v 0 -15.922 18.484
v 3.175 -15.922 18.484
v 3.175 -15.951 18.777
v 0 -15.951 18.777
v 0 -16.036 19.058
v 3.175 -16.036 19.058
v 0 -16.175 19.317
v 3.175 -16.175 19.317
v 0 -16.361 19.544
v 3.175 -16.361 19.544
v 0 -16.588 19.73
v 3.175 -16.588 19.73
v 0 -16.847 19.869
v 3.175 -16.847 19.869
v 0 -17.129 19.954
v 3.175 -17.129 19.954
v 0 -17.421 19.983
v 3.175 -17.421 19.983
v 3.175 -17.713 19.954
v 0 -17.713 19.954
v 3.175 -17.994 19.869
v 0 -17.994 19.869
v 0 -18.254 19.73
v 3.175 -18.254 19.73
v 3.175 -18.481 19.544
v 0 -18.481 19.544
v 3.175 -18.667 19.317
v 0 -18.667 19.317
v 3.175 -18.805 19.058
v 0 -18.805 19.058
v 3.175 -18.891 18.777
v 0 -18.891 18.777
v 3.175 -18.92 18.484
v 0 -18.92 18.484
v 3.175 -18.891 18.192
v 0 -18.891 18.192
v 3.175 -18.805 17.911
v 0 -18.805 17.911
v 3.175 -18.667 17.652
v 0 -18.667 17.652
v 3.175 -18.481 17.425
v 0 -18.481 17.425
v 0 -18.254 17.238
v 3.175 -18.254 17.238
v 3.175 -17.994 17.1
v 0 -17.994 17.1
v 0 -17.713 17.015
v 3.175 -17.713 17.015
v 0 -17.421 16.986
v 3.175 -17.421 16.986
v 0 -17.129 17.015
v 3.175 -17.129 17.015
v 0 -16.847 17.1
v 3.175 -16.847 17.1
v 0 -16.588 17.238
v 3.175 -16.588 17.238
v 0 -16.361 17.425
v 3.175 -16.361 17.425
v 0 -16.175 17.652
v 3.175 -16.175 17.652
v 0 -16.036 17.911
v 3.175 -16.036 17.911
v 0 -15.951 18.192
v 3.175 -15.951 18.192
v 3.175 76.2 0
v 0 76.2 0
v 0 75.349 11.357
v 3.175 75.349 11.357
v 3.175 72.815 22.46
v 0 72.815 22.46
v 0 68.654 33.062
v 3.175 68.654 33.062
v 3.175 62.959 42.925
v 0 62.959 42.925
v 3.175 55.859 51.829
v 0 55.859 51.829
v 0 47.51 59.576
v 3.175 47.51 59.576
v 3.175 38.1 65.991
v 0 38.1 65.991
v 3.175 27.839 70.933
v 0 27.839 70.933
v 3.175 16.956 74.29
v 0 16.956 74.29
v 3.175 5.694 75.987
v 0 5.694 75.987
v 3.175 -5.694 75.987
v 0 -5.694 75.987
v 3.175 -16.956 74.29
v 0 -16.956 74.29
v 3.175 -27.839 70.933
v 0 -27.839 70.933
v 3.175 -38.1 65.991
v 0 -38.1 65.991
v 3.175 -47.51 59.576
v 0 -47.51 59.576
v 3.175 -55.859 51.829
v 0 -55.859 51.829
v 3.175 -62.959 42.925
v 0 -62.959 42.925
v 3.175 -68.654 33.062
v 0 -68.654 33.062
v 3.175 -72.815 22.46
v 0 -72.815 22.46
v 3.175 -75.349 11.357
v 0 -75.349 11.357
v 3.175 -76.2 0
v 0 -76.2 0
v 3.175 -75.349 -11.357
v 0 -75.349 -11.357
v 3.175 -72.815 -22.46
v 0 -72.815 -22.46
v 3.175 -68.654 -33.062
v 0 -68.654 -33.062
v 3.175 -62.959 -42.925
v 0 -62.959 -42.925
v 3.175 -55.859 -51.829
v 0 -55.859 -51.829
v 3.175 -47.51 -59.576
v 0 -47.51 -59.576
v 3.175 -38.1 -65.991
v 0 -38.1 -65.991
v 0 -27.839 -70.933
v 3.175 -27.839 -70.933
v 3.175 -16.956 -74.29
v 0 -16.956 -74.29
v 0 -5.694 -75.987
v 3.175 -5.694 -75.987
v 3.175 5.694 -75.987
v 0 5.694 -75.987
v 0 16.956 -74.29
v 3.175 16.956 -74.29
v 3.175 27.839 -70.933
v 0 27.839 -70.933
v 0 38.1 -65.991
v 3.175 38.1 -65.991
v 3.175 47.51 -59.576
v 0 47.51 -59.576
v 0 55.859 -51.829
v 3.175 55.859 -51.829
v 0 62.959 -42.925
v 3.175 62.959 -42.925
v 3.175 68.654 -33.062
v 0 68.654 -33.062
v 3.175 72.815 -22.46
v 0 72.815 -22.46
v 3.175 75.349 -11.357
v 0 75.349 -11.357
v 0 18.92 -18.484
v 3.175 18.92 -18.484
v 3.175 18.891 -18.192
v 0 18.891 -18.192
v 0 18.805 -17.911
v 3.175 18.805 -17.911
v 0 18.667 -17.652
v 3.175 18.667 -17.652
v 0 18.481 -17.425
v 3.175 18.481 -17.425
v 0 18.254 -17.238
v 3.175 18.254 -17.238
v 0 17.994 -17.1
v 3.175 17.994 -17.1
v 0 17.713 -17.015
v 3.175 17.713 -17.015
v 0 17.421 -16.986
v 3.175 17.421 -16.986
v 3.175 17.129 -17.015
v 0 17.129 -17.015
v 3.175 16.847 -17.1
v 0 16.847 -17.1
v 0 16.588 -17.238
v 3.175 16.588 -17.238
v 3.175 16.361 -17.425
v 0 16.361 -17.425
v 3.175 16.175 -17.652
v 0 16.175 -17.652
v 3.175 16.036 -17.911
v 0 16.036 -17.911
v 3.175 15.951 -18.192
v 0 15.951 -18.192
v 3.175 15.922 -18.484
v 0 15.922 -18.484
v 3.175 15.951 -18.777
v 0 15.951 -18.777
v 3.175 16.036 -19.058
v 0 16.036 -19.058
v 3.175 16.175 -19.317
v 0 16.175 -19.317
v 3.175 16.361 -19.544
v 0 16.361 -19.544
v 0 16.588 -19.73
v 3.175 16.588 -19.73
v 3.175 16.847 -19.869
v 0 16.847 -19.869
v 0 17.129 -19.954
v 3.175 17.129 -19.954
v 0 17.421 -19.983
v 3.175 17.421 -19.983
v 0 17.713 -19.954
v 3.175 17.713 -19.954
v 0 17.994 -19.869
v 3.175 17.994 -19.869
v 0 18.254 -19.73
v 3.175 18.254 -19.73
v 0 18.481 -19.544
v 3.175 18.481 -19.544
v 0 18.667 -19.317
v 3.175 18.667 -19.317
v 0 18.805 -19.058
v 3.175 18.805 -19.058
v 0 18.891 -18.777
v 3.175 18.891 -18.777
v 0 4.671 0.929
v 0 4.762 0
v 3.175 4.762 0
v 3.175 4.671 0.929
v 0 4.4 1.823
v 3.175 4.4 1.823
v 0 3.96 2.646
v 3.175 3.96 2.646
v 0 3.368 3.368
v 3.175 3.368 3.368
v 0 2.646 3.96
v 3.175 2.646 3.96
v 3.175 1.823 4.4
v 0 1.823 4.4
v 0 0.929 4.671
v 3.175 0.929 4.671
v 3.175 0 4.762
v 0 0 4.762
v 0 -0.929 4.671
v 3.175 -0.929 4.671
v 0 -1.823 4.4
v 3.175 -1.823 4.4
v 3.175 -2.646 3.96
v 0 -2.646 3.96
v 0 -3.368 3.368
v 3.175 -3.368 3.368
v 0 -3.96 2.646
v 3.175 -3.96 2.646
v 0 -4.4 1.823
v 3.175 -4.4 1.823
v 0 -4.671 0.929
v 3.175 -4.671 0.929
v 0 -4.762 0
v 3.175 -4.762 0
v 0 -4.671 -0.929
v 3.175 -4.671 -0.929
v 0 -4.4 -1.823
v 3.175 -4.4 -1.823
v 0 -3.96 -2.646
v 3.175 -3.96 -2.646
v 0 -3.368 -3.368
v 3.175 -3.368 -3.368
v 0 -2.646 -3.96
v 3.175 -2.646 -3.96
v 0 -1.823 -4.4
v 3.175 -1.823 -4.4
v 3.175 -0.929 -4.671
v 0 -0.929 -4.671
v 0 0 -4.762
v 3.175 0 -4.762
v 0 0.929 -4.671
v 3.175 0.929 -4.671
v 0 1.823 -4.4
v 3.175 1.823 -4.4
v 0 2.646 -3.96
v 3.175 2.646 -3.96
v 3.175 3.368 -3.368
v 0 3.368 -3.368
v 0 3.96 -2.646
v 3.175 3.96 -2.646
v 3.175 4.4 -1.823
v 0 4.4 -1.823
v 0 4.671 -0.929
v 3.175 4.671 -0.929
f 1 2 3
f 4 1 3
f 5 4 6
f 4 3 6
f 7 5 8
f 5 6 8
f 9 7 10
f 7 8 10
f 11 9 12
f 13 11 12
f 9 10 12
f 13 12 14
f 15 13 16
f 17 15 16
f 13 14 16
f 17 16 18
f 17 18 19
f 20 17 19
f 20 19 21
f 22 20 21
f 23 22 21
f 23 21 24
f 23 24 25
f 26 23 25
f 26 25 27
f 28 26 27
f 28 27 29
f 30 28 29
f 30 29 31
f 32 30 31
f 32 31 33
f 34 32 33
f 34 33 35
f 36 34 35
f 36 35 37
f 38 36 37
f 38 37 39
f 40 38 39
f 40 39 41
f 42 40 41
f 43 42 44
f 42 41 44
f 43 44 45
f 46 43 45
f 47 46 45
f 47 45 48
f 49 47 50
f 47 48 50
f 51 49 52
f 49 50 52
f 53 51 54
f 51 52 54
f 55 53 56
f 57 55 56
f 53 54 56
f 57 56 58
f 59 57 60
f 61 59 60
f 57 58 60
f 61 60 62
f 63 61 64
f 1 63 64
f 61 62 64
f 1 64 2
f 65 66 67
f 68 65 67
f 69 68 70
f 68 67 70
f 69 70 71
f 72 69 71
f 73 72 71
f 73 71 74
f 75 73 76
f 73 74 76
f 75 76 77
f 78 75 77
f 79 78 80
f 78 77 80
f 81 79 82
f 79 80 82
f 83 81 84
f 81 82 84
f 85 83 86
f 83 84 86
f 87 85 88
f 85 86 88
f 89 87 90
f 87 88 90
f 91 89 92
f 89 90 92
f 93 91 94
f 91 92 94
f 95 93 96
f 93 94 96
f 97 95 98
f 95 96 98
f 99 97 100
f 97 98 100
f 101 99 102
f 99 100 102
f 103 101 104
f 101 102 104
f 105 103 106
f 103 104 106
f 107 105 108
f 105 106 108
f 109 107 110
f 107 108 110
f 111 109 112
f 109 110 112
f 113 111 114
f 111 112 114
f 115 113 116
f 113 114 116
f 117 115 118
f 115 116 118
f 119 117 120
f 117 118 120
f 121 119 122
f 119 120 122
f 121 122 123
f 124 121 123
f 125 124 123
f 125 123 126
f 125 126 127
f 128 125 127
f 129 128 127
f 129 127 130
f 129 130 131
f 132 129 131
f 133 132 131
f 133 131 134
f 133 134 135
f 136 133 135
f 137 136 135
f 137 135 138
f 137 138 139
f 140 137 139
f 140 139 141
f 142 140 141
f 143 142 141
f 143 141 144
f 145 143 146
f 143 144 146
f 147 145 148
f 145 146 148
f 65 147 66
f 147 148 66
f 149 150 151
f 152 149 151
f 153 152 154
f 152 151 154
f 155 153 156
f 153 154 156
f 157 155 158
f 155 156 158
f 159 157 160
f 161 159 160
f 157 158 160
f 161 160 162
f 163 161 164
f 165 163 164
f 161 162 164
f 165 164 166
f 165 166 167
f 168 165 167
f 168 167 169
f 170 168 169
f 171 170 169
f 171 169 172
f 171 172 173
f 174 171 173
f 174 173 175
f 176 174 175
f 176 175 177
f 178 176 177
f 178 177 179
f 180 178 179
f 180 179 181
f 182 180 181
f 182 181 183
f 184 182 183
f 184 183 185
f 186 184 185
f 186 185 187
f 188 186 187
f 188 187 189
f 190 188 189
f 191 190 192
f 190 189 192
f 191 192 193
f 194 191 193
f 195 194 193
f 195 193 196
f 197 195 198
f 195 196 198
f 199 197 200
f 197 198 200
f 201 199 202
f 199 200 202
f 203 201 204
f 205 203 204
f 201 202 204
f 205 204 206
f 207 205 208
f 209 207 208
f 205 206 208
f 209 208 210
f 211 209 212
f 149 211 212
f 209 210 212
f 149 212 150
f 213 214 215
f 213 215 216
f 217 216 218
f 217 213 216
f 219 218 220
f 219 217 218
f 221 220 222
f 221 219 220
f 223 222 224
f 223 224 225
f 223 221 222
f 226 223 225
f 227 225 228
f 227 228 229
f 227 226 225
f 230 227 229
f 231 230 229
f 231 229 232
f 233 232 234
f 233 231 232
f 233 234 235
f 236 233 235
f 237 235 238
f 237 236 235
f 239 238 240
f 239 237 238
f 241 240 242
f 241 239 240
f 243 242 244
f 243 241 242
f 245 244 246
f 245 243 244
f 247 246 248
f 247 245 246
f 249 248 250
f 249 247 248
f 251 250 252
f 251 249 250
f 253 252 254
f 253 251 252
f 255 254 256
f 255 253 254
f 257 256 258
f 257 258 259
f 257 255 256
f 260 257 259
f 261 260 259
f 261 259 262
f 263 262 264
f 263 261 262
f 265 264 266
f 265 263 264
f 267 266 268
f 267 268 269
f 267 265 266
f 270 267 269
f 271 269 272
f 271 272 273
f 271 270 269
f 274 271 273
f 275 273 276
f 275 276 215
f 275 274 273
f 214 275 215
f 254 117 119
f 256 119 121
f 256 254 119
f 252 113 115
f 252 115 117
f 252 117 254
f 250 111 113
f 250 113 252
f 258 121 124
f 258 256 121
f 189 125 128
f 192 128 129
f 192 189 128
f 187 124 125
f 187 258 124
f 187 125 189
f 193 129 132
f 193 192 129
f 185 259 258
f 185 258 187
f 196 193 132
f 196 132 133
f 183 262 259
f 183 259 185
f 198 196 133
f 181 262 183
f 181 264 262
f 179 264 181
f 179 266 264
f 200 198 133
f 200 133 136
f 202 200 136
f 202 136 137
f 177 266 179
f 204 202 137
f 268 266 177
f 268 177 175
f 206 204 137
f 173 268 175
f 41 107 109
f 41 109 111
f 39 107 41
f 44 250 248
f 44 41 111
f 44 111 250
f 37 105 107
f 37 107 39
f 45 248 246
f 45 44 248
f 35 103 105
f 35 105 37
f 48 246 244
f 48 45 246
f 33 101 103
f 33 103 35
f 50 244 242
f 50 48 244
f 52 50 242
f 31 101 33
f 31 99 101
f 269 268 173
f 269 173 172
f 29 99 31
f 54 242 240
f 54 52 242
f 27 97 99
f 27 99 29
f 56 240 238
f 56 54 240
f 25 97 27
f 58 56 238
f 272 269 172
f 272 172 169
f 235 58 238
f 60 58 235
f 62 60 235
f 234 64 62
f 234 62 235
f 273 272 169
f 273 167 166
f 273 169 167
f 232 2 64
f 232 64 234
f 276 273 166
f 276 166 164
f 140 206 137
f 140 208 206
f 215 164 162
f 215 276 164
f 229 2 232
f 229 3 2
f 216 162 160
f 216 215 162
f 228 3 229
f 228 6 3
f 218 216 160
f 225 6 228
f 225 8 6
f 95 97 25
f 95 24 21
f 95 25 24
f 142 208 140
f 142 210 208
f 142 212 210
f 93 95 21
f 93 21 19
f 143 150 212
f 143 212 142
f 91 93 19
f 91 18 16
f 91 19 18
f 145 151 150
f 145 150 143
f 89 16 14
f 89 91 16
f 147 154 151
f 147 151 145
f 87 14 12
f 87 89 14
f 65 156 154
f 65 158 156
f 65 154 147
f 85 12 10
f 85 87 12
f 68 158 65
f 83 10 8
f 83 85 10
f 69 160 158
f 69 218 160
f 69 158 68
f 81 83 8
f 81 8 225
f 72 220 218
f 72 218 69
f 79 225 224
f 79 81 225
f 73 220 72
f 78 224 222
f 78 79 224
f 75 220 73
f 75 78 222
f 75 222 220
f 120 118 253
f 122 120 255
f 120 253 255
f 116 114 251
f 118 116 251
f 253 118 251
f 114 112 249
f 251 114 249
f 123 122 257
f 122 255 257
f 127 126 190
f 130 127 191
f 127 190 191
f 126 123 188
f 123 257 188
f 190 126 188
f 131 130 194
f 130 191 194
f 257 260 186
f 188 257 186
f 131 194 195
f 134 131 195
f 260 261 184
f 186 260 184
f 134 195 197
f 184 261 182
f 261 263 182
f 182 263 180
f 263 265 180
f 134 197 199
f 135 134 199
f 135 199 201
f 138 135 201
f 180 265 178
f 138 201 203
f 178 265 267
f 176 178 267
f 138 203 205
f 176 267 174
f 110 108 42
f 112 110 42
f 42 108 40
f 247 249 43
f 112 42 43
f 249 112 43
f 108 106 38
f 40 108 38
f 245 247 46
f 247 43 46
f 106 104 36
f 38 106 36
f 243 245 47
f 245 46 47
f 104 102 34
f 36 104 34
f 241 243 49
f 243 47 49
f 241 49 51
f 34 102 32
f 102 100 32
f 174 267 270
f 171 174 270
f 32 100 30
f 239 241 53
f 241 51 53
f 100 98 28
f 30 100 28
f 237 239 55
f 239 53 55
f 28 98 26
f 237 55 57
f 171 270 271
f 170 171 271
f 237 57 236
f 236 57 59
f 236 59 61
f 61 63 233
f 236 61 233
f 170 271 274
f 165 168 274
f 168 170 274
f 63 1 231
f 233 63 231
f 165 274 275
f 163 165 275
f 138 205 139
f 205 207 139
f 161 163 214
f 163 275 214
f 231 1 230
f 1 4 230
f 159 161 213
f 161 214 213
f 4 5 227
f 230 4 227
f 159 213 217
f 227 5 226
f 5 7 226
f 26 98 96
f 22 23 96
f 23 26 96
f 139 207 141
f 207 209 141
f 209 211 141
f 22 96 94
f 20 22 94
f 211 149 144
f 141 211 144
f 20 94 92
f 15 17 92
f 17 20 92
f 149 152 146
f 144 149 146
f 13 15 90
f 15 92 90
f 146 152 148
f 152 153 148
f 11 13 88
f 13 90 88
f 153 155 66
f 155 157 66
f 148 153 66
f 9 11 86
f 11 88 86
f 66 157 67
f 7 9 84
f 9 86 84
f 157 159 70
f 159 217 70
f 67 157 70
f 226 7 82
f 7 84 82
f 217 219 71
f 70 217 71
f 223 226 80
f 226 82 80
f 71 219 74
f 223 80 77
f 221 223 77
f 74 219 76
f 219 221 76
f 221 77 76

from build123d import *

# Parameters (mm, degrees)
F0_R     = 76.2
F0_R_2   = 4.7625
F1_DEPTH = 3.175
F2_R     = 1.5875
F3_DEPTH = 3.176
F4_R     = 1.4986
F5_DEPTH = 25.4


with BuildPart() as f1:
    # F0 (on Right) → F1 (new body)
    with BuildSketch(Plane.YZ):
        Circle(F0_R)
        Circle(F0_R_2, mode=Mode.SUBTRACT)
    extrude(amount=F1_DEPTH)

    # F2 (on face) → F3 (cut, through all)
    with BuildSketch(Plane.YZ.offset(3.175)):
        Circle(F2_R)
    extrude(amount=-F3_DEPTH, mode=Mode.SUBTRACT)

    # F4 (on face) → F5 (cut)
    with BuildSketch(Plane.YZ.offset(3.175)):
        with Locations((-17.420961, 18.484321)):
            Circle(F4_R)
        with Locations((17.420961, -18.484321)):
            Circle(F4_R)
    extrude(amount=-F5_DEPTH, mode=Mode.SUBTRACT)


solid = f1.part
